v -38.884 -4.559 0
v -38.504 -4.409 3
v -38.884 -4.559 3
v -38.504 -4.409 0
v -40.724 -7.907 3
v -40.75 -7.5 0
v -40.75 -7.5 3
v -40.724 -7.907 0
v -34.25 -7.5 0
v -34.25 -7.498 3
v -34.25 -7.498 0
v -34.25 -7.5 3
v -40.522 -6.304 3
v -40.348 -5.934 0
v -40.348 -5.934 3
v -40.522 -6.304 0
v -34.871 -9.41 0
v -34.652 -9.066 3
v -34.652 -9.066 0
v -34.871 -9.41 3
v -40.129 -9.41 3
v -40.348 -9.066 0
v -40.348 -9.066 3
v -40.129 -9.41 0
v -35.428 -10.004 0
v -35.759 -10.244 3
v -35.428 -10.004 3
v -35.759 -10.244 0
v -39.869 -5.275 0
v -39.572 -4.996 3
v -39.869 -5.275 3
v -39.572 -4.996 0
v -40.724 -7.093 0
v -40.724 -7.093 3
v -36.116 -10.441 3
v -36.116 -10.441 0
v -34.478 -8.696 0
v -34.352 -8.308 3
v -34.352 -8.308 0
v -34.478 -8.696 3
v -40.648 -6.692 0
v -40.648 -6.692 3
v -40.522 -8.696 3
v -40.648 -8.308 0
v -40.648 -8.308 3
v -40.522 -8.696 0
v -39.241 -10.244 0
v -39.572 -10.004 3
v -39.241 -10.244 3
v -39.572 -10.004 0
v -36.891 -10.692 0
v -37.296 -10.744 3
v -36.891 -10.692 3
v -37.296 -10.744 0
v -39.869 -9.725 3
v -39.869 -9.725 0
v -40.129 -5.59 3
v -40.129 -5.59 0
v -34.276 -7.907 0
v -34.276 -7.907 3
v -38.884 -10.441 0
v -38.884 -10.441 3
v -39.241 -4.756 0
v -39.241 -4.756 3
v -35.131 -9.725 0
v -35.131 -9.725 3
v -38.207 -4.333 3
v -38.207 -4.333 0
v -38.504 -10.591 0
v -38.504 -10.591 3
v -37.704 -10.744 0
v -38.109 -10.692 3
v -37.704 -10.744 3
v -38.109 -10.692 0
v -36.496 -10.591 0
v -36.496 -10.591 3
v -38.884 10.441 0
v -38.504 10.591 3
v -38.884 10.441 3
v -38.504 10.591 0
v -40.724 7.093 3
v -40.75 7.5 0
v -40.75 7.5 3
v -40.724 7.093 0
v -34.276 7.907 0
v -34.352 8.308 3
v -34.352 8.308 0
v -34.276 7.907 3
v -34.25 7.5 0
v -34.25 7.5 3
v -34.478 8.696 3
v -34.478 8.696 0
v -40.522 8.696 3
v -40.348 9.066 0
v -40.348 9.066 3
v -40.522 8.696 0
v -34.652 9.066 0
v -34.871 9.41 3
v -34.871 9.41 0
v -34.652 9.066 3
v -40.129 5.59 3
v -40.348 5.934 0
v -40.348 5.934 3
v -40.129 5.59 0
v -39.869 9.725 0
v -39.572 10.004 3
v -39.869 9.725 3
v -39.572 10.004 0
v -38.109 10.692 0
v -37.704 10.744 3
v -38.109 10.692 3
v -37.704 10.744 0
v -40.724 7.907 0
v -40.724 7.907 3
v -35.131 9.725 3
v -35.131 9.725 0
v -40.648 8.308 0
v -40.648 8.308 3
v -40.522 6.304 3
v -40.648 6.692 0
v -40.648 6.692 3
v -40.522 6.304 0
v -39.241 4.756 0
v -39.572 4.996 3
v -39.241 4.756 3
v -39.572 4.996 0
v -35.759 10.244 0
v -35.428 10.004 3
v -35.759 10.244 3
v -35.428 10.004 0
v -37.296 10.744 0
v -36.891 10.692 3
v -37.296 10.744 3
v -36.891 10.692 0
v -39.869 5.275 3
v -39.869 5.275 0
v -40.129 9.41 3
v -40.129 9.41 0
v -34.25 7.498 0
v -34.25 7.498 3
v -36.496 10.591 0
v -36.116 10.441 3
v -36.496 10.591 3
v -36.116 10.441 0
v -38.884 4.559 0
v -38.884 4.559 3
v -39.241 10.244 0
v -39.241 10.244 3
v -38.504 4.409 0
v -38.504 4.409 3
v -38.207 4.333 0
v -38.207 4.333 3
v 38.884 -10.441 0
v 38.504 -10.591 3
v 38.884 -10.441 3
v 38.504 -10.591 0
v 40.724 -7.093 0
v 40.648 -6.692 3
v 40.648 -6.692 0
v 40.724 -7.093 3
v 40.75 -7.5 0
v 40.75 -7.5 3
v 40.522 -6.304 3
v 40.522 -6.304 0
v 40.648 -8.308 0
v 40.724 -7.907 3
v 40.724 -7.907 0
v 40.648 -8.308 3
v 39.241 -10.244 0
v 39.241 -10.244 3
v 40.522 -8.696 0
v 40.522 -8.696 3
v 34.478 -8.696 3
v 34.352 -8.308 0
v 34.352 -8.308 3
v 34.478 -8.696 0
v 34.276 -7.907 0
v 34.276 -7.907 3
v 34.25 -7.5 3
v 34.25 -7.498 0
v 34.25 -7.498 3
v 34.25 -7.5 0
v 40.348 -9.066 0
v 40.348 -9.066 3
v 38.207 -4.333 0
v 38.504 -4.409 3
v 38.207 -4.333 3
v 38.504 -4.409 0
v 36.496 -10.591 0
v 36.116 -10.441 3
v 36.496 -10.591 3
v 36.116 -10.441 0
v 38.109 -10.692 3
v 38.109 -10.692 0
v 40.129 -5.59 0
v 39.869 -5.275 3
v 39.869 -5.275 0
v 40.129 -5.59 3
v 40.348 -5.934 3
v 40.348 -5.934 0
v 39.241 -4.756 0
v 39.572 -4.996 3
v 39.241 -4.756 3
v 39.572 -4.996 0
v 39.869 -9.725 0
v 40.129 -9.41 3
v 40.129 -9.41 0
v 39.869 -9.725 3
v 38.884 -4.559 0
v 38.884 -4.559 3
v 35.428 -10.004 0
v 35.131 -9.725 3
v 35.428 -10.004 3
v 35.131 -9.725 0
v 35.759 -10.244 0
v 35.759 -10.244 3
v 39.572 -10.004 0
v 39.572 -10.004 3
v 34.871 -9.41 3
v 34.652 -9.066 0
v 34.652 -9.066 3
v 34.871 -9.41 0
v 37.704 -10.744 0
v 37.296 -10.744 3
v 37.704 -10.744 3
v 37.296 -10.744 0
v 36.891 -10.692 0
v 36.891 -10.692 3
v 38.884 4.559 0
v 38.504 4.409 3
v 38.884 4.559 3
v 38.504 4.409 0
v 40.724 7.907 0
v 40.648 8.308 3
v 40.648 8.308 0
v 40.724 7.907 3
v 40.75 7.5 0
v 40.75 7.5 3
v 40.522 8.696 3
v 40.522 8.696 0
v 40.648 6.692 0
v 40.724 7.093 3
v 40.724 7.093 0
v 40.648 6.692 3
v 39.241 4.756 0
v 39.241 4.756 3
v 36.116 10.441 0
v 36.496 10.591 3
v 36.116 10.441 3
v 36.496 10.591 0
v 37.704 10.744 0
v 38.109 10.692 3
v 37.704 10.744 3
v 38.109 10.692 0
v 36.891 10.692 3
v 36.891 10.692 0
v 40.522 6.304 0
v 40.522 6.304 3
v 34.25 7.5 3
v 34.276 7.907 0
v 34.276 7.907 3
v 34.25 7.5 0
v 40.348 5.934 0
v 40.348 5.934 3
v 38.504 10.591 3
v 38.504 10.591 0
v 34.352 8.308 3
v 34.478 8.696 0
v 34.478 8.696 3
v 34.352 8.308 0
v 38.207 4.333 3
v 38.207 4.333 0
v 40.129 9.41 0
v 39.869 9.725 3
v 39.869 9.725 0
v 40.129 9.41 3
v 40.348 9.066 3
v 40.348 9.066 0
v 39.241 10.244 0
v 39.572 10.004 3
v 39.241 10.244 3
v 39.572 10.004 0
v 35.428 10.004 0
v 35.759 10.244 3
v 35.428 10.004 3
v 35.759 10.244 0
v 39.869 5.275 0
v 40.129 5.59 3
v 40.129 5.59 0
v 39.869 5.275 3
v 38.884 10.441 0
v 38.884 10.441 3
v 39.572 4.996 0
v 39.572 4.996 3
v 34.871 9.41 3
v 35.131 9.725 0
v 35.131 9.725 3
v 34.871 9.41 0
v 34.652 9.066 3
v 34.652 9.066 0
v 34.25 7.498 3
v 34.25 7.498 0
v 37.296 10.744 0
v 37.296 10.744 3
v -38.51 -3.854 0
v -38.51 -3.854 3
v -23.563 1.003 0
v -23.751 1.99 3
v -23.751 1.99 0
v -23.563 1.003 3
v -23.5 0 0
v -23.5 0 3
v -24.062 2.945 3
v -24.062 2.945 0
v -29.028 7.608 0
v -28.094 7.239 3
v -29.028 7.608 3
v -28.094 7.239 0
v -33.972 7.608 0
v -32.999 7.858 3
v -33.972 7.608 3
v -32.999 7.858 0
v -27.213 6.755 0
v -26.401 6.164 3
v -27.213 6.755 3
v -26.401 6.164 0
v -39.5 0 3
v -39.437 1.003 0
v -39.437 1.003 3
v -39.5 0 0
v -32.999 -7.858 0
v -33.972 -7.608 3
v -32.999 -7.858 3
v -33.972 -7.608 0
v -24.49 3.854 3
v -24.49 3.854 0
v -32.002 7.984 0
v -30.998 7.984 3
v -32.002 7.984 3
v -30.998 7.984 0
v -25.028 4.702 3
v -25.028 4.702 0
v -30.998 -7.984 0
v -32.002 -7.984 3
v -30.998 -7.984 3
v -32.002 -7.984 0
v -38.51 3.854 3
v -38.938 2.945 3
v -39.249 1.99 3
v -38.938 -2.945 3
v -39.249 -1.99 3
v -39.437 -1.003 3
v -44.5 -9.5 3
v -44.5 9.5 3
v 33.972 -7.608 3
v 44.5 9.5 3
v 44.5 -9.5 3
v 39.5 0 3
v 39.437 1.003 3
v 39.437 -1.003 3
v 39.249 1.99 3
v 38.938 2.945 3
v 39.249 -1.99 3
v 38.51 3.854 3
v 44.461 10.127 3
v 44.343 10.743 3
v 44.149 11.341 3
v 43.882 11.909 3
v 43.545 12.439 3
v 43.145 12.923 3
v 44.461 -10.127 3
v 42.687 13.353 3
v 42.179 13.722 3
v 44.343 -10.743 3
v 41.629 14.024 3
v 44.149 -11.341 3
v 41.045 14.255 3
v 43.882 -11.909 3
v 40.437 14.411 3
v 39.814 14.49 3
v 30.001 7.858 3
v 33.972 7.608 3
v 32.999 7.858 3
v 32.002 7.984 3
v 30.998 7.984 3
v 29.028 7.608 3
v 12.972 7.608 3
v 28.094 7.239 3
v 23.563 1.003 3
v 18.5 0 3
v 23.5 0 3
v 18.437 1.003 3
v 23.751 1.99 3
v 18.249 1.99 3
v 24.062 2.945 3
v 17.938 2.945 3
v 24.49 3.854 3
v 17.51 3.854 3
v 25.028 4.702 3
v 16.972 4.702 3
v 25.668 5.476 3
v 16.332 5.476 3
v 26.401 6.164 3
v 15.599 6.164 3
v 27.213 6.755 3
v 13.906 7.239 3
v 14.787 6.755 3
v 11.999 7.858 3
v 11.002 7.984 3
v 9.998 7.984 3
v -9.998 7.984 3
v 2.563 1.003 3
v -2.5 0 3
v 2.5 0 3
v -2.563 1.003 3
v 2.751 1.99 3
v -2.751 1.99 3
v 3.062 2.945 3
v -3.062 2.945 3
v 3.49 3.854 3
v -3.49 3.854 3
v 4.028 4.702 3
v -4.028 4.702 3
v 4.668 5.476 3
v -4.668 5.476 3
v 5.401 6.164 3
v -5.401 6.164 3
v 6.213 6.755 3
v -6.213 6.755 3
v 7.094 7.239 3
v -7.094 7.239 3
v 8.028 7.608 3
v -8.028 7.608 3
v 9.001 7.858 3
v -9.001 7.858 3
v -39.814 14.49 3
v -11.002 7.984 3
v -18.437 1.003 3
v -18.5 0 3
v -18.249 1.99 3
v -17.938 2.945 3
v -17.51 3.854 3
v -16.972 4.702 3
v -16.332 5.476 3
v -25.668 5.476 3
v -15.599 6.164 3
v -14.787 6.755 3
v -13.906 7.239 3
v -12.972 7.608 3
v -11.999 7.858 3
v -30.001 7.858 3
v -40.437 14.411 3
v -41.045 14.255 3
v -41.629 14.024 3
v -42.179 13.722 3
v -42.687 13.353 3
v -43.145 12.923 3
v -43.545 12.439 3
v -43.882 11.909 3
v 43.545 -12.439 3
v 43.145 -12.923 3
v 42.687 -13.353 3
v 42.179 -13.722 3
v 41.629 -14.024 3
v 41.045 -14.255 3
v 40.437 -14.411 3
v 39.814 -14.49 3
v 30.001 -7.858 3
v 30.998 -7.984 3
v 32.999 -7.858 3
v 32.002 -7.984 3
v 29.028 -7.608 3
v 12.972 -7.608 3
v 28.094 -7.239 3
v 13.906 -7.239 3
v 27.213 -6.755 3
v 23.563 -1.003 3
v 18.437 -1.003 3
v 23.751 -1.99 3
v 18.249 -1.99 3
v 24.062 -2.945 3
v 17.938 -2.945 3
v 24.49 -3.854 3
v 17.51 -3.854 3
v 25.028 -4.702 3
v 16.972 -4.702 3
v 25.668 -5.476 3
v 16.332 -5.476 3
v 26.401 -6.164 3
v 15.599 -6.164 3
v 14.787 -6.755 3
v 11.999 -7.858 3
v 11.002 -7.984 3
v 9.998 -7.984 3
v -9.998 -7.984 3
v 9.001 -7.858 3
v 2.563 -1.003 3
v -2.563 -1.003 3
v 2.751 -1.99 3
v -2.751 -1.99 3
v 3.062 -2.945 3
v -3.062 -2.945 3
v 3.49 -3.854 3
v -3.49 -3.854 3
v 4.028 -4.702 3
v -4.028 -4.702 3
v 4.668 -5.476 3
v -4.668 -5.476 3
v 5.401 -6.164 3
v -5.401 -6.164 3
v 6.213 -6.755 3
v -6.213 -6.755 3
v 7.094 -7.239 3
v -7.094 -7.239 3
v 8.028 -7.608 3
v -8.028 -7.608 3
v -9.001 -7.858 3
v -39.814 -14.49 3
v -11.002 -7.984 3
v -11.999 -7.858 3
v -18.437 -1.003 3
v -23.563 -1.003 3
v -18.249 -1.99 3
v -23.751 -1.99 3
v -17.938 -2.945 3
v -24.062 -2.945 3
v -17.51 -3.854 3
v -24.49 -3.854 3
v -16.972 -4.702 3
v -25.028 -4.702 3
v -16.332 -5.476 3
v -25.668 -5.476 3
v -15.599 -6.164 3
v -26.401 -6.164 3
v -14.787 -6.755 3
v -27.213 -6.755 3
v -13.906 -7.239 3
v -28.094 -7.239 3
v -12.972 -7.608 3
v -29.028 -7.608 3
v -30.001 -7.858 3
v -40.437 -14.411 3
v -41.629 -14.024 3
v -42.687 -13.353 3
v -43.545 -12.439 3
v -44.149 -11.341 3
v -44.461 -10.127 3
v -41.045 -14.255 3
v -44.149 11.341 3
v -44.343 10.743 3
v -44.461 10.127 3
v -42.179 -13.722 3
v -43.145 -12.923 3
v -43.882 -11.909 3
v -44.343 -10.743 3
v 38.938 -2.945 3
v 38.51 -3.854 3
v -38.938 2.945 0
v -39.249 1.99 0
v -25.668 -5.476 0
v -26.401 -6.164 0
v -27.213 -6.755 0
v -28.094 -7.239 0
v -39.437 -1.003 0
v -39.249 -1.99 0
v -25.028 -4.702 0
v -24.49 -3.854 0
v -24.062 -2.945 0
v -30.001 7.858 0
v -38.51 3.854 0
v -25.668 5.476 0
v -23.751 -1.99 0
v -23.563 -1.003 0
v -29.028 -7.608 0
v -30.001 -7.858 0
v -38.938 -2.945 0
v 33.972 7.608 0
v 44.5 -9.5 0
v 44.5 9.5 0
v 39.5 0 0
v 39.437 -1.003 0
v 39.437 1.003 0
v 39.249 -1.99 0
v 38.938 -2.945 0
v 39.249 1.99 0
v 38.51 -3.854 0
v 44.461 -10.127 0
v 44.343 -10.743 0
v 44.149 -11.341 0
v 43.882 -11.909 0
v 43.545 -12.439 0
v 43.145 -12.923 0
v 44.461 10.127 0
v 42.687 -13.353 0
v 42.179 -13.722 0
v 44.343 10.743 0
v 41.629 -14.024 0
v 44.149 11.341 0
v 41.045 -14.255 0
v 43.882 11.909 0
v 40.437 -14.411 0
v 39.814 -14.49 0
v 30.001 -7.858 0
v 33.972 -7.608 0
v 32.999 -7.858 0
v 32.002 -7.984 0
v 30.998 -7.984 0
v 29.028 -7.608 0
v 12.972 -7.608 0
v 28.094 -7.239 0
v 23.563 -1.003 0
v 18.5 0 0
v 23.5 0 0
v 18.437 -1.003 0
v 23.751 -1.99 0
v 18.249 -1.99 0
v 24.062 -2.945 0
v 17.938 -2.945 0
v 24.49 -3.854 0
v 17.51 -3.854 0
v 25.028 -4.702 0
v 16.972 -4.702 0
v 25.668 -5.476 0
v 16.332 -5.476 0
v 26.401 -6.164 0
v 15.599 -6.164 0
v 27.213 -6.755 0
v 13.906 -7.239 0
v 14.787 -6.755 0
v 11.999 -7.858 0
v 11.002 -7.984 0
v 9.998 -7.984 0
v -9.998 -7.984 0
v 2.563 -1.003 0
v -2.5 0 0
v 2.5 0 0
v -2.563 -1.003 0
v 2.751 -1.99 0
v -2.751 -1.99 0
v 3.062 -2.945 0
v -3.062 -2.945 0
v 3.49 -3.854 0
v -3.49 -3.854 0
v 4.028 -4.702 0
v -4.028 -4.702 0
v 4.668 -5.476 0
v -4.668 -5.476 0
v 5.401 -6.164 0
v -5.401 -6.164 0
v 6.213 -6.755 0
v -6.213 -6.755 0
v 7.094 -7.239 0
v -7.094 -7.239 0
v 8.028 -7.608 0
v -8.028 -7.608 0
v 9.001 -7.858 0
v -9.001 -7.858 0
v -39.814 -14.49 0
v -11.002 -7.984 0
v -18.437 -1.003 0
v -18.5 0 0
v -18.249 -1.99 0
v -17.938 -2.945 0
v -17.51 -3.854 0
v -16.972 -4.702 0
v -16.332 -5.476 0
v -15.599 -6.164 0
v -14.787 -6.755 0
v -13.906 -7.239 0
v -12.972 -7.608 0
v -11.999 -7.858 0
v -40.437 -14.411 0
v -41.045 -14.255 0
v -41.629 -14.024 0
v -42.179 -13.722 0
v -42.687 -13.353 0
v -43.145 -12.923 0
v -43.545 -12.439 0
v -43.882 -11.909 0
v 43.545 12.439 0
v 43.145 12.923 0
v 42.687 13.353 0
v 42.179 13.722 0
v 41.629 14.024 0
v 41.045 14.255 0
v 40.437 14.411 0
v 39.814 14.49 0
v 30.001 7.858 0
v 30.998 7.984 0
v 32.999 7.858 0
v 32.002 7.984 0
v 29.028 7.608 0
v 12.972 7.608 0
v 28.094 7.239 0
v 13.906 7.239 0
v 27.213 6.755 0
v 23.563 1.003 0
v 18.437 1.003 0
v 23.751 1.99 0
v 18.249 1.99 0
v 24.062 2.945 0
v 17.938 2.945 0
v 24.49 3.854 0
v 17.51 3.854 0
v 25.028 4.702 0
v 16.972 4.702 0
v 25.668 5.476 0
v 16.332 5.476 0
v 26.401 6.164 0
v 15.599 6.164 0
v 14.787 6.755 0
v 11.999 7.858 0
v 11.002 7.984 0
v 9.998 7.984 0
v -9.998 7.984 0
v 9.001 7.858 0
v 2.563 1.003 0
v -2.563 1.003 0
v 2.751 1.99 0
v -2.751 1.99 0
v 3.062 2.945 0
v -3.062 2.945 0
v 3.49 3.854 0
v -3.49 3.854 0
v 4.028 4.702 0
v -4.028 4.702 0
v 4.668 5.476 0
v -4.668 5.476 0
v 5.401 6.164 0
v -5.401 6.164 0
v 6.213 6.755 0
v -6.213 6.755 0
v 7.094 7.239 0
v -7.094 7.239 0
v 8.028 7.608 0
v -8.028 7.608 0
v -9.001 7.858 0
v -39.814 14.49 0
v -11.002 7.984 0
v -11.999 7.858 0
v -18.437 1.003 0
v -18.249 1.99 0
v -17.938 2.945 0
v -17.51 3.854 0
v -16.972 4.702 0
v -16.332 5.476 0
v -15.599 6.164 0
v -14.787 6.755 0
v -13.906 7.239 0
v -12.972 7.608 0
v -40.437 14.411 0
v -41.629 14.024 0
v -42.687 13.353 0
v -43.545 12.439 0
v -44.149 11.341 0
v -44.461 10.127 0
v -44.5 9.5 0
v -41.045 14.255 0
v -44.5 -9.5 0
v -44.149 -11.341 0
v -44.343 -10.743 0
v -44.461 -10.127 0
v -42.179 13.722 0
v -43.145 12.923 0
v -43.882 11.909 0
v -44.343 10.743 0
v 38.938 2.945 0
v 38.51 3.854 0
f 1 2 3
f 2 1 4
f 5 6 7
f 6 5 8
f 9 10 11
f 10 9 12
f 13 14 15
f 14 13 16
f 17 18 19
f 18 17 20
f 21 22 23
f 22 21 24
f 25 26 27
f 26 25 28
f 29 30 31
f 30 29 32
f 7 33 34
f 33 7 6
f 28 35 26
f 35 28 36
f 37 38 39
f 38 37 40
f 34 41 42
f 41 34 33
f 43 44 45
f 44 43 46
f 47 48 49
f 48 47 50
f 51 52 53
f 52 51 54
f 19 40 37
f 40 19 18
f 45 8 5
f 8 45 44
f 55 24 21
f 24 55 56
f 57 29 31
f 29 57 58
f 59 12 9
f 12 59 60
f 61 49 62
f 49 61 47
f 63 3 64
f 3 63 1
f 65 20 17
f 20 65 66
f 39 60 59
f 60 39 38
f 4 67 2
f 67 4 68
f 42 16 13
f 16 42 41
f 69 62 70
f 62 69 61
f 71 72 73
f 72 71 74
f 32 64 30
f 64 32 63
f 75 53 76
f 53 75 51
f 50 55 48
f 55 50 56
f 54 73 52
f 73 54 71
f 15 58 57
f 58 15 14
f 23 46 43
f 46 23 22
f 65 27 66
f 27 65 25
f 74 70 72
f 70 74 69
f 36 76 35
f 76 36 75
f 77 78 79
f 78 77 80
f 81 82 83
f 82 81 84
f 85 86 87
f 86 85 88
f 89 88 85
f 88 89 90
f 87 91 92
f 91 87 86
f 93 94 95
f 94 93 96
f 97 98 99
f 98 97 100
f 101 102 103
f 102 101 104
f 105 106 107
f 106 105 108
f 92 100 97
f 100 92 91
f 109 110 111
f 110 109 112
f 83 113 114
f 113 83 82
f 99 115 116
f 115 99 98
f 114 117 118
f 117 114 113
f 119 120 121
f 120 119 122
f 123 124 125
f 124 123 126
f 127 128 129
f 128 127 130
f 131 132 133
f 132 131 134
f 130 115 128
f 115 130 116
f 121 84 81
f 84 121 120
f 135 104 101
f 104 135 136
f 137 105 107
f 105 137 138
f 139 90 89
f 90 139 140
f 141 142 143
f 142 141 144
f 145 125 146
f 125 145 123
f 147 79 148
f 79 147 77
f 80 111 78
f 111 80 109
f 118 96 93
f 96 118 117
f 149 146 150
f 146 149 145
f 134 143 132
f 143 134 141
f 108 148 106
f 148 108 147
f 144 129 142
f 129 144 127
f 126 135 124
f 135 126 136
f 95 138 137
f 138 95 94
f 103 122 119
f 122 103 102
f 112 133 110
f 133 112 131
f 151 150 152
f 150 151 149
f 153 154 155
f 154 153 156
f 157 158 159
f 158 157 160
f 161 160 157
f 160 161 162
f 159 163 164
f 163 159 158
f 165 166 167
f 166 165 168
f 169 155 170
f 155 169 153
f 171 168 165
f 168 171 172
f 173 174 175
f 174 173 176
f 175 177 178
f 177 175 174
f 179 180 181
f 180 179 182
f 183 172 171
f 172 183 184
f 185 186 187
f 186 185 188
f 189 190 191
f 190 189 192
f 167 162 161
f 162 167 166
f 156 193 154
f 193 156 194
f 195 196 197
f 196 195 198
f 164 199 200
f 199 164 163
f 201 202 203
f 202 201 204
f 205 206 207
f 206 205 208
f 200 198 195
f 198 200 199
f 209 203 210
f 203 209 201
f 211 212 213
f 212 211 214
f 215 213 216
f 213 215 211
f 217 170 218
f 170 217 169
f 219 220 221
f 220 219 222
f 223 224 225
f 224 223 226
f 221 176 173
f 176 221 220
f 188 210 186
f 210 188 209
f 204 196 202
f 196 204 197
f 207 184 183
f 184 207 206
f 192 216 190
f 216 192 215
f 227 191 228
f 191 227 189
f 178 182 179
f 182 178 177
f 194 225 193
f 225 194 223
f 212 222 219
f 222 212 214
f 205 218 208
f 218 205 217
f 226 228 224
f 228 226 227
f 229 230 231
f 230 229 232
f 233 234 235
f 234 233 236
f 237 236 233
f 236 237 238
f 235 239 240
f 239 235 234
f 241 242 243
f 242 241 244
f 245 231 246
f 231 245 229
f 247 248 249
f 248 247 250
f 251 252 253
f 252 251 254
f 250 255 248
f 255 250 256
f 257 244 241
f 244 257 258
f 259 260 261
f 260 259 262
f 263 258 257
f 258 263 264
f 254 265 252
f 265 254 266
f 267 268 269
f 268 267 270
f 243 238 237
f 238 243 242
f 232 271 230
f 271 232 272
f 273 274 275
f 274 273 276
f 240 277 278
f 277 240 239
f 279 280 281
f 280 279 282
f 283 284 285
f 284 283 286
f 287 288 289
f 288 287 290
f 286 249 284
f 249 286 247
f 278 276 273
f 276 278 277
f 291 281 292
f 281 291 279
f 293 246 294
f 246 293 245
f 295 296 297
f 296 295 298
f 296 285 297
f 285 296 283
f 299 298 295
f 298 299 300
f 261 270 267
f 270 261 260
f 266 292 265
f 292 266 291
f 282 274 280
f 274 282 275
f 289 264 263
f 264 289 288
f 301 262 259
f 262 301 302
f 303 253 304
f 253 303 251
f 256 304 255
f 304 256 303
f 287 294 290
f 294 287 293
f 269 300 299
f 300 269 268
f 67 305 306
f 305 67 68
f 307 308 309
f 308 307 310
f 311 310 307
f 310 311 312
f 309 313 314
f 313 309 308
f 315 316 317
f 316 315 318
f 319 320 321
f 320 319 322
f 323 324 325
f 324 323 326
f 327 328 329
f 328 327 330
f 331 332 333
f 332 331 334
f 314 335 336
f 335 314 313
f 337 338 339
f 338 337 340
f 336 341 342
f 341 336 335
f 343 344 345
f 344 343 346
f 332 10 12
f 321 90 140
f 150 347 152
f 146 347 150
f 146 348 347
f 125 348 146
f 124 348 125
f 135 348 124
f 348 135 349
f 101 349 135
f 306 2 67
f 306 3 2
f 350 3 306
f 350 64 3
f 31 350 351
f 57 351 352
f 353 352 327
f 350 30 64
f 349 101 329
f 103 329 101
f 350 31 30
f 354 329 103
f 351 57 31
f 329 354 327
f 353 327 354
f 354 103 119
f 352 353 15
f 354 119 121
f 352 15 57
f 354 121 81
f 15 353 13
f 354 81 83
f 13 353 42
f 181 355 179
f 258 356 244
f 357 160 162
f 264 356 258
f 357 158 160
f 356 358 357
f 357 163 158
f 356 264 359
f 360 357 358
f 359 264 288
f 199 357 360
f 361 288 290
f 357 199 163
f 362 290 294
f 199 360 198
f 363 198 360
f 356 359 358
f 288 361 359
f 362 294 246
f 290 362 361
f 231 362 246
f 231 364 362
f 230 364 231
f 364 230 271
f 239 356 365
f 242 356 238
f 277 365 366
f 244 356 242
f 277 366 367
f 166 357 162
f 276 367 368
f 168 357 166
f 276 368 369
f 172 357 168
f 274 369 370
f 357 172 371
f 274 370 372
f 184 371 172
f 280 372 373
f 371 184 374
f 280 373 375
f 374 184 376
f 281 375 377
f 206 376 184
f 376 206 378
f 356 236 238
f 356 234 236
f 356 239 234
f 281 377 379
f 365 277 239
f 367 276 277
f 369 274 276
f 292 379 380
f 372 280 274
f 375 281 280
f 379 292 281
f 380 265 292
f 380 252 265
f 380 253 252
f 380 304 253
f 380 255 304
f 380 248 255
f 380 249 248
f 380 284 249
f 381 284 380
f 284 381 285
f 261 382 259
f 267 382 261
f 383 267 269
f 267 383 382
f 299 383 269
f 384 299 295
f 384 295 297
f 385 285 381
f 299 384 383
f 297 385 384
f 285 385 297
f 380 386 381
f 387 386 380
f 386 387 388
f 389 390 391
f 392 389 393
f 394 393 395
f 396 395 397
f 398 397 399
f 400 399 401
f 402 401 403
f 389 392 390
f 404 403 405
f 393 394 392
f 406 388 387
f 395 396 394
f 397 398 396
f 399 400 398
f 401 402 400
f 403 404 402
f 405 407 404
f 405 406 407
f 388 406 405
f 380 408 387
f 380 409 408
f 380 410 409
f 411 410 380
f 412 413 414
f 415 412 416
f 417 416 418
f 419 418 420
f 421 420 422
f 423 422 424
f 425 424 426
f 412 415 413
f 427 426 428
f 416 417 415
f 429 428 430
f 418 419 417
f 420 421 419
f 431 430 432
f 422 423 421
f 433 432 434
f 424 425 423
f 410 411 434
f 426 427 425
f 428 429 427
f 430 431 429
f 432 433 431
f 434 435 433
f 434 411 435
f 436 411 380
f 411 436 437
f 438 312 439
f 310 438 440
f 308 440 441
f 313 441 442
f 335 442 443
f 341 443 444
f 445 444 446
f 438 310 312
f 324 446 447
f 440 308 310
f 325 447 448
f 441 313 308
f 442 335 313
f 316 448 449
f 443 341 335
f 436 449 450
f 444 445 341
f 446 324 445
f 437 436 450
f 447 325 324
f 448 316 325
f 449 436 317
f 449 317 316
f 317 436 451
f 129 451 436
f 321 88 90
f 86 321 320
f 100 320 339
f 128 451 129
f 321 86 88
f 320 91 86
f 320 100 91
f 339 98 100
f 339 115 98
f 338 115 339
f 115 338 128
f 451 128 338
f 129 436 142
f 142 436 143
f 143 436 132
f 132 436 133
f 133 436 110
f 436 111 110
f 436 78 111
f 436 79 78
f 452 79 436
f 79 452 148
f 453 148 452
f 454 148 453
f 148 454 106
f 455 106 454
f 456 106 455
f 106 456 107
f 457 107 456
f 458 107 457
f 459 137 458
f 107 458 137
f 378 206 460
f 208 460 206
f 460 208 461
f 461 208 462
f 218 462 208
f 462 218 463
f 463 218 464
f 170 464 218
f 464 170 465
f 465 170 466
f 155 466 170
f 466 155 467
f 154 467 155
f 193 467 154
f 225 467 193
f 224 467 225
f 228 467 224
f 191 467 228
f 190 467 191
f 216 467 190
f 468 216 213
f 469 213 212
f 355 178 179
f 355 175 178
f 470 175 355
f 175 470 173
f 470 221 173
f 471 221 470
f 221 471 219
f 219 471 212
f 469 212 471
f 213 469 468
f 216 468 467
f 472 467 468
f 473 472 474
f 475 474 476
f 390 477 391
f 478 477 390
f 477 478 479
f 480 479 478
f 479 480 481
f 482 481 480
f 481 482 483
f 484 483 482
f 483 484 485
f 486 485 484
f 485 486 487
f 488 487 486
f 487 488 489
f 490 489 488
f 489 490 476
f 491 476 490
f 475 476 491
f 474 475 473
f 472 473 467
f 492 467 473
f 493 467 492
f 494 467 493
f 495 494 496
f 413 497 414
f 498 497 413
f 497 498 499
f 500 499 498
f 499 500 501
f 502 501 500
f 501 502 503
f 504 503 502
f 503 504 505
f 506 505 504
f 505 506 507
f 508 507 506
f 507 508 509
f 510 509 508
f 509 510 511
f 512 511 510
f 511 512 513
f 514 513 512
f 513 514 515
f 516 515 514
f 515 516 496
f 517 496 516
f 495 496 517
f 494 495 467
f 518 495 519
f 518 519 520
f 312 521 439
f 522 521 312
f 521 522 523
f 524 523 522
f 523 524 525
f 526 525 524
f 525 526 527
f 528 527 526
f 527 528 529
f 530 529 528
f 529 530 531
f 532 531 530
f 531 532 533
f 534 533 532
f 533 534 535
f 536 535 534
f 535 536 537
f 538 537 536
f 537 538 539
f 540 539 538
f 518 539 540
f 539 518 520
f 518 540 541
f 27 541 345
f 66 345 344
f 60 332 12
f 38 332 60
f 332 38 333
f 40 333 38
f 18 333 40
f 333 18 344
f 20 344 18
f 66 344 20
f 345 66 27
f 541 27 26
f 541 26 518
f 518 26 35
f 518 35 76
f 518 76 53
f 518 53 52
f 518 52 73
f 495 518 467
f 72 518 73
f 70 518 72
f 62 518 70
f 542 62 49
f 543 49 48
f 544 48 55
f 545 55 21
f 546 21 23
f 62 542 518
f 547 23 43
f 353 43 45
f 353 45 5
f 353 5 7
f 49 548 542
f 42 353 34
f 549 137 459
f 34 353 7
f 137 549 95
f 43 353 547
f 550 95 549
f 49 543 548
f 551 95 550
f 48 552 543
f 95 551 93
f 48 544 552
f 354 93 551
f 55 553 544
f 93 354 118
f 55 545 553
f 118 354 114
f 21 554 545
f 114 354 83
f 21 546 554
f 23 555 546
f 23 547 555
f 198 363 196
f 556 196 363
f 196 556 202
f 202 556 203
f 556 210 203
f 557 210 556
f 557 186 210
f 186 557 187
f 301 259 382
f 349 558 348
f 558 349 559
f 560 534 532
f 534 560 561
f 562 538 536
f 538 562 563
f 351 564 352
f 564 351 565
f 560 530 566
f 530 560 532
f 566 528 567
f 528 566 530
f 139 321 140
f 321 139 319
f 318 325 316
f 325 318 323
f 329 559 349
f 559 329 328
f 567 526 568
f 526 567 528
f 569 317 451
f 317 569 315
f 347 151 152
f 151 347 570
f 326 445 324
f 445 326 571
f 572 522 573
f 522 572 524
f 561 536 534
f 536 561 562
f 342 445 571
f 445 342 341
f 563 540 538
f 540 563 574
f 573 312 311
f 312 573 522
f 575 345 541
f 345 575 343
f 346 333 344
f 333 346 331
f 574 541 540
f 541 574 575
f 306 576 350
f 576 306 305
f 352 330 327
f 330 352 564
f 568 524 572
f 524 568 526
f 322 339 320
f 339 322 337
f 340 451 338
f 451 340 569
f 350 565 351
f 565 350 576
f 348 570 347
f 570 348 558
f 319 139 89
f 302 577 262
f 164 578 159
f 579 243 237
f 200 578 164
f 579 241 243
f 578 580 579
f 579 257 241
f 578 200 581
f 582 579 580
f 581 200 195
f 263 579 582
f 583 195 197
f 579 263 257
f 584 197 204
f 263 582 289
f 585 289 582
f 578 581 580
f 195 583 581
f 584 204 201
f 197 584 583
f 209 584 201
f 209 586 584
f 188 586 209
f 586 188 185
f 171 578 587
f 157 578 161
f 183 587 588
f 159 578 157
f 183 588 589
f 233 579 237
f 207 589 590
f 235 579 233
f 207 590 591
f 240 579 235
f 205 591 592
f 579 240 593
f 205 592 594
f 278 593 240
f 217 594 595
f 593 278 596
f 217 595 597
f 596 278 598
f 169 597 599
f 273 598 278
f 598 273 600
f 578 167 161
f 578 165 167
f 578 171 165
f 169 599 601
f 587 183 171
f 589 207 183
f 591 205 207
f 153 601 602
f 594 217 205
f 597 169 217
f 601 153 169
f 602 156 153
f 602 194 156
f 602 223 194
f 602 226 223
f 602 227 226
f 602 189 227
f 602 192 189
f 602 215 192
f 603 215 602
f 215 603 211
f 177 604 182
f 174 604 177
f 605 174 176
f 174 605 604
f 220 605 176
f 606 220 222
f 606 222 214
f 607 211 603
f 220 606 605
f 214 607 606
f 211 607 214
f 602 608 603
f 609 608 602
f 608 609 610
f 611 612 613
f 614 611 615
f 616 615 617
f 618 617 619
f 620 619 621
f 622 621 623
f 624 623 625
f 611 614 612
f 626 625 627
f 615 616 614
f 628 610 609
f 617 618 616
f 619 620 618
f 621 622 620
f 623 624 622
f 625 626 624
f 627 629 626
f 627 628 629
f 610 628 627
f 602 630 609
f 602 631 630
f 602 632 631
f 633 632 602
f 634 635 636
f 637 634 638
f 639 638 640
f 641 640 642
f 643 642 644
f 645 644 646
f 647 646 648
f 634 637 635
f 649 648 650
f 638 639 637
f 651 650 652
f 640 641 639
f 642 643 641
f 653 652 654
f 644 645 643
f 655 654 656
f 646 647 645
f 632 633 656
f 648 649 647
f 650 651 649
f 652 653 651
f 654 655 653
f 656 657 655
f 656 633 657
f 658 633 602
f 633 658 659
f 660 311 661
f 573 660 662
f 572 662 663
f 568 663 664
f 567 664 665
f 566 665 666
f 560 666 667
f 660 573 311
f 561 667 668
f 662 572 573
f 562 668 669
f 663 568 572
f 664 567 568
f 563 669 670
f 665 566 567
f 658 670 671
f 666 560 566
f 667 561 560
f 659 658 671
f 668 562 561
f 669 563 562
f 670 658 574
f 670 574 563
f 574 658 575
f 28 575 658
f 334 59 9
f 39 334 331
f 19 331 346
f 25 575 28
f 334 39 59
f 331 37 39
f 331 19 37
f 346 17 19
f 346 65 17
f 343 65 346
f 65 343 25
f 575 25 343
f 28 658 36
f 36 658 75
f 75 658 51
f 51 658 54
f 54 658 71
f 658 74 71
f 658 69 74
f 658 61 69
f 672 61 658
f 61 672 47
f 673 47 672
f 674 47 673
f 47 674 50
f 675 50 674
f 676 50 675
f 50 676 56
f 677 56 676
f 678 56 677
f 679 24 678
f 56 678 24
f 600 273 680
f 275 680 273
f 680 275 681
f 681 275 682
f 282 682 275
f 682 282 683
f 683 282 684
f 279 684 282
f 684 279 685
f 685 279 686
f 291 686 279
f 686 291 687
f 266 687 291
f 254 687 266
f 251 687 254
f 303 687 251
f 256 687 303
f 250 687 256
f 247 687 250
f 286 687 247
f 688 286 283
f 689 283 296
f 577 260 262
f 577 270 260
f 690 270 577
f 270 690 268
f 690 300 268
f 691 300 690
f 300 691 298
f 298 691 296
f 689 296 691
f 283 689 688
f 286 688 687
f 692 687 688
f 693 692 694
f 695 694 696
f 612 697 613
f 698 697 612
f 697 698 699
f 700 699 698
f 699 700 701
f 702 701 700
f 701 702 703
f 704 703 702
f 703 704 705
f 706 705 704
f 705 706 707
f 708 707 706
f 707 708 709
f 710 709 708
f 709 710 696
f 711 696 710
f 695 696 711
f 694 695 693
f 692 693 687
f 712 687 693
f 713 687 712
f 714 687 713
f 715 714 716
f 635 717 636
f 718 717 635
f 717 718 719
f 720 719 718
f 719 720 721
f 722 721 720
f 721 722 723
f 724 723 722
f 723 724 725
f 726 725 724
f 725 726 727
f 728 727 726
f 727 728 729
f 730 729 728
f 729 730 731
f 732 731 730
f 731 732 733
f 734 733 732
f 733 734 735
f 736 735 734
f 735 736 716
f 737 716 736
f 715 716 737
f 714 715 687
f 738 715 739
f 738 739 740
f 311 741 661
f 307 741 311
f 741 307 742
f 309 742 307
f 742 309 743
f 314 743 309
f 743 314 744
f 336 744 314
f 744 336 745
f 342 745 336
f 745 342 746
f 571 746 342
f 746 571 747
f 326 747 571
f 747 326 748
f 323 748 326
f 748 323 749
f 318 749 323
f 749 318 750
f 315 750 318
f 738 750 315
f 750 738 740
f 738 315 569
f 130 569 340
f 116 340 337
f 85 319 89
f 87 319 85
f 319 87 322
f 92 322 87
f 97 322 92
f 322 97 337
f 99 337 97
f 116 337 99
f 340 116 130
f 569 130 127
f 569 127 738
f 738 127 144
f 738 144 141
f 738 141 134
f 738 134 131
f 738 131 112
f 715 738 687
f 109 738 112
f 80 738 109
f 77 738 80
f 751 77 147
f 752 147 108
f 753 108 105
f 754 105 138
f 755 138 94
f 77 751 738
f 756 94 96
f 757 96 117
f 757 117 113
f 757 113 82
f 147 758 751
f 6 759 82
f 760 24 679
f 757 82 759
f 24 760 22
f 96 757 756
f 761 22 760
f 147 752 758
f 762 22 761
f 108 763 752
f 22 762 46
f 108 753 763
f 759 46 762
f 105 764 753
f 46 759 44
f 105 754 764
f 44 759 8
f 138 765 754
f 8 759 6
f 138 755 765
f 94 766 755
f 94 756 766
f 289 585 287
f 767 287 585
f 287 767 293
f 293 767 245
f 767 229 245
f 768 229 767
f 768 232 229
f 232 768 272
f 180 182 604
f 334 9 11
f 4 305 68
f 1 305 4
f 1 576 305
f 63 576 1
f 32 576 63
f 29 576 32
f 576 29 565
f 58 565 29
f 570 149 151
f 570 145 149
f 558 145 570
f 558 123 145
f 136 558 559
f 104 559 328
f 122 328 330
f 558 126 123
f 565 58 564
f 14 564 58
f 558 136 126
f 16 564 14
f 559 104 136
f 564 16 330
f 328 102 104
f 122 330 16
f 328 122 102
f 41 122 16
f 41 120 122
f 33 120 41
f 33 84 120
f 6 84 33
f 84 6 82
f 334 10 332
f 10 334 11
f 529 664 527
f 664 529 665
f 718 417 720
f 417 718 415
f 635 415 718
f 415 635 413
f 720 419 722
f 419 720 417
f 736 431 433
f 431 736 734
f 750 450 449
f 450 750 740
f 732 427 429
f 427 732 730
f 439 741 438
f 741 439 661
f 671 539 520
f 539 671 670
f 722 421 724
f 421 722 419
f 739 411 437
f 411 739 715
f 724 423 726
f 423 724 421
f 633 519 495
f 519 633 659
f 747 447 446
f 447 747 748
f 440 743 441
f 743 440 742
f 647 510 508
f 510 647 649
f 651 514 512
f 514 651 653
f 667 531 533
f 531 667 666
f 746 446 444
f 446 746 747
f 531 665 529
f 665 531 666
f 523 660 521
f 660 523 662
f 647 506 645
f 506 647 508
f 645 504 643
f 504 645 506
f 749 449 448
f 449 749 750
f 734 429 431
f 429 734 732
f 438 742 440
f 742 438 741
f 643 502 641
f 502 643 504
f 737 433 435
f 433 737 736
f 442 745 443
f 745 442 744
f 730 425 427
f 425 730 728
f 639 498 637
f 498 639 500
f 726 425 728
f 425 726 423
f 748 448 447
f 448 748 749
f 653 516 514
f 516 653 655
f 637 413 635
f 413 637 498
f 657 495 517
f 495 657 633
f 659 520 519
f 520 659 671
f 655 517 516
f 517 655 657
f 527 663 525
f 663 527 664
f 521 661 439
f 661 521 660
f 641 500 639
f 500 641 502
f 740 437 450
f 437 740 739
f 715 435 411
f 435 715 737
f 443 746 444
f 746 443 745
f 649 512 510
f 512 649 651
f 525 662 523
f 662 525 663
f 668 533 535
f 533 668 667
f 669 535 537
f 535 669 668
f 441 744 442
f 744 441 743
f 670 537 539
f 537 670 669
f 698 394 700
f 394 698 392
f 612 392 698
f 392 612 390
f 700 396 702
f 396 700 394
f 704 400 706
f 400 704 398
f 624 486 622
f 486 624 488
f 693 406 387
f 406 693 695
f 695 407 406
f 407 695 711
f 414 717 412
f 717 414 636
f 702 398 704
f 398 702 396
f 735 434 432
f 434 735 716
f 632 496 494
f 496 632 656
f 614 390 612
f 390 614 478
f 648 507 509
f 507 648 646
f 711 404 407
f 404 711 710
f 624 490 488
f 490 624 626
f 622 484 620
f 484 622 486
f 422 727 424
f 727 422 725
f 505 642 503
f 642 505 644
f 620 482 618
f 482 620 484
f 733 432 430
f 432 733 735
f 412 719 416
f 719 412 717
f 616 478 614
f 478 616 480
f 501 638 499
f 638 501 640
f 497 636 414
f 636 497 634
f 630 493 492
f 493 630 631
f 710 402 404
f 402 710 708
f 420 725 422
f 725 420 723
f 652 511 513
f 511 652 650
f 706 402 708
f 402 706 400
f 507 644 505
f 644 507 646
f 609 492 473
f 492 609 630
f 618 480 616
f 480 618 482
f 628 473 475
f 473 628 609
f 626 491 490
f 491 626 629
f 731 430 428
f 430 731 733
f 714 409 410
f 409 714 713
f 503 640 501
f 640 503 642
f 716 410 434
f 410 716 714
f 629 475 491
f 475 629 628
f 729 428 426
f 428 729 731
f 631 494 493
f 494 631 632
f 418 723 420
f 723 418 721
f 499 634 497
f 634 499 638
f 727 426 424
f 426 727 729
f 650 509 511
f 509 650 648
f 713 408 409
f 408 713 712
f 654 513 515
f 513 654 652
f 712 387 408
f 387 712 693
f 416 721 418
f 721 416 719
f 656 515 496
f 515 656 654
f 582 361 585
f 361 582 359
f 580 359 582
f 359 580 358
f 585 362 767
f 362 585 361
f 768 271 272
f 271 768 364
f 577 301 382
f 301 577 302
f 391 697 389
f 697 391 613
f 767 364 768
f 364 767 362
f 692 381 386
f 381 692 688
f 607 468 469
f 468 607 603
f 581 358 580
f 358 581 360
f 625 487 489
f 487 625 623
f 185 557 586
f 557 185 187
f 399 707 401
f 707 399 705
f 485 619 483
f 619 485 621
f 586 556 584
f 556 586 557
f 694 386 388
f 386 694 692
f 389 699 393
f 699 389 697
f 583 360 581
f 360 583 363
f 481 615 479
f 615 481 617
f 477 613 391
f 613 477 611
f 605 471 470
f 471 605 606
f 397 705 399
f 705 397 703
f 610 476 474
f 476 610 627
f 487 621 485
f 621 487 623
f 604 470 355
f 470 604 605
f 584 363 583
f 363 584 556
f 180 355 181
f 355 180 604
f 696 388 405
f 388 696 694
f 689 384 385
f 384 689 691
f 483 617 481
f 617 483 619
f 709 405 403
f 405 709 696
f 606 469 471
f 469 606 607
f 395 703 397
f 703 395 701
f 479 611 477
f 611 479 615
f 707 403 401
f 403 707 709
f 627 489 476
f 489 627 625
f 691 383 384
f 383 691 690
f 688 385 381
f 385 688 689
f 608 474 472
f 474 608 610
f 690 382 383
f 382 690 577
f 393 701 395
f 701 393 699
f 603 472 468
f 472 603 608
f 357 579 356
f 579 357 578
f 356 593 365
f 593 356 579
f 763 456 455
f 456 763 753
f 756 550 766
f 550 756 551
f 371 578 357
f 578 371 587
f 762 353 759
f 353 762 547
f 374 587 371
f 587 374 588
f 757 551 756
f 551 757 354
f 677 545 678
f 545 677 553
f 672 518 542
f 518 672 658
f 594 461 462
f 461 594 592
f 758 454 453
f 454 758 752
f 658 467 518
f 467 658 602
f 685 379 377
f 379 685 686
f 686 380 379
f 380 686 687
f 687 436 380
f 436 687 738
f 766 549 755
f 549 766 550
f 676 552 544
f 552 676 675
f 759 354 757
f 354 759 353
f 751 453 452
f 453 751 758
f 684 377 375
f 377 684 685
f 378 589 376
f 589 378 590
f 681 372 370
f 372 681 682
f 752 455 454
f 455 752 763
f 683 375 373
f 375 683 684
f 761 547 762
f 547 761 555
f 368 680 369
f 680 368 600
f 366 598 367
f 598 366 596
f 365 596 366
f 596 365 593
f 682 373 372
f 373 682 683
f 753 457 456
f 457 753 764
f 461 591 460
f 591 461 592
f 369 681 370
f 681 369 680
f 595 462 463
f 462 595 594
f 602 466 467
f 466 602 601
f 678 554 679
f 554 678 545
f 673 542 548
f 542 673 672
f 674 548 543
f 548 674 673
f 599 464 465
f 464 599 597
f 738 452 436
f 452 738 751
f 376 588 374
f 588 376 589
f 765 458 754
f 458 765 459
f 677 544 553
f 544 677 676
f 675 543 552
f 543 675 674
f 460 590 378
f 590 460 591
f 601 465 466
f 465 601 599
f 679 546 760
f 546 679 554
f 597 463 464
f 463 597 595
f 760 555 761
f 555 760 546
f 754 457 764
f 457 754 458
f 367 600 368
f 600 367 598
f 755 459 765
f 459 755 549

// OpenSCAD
$fn = 50;


difference() {
	union() {
		hull() {
			translate(v = [-39.5000000000, 9.5000000000, 0]) {
				cylinder(h = 3, r = 5);
			}
			translate(v = [39.5000000000, 9.5000000000, 0]) {
				cylinder(h = 3, r = 5);
			}
			translate(v = [-39.5000000000, -9.5000000000, 0]) {
				cylinder(h = 3, r = 5);
			}
			translate(v = [39.5000000000, -9.5000000000, 0]) {
				cylinder(h = 3, r = 5);
			}
		}
	}
	union() {
		#translate(v = [-37.5000000000, -7.5000000000, -100.0000000000]) {
			cylinder(h = 200, r = 3.2500000000);
		}
		#translate(v = [-37.5000000000, 7.5000000000, -100.0000000000]) {
			cylinder(h = 200, r = 3.2500000000);
		}
		#translate(v = [37.5000000000, -7.5000000000, -100.0000000000]) {
			cylinder(h = 200, r = 3.2500000000);
		}
		#translate(v = [37.5000000000, 7.5000000000, -100.0000000000]) {
			cylinder(h = 200, r = 3.2500000000);
		}
		#translate(v = [-31.5000000000, 0, 0]) {
			cylinder(h = 3, r = 8.0000000000);
		}
		#translate(v = [-10.5000000000, 0, 0]) {
			cylinder(h = 3, r = 8.0000000000);
		}
		#translate(v = [10.5000000000, 0, 0]) {
			cylinder(h = 3, r = 8.0000000000);
		}
		#translate(v = [31.5000000000, 0, 0]) {
			cylinder(h = 3, r = 8.0000000000);
		}
	}
}
